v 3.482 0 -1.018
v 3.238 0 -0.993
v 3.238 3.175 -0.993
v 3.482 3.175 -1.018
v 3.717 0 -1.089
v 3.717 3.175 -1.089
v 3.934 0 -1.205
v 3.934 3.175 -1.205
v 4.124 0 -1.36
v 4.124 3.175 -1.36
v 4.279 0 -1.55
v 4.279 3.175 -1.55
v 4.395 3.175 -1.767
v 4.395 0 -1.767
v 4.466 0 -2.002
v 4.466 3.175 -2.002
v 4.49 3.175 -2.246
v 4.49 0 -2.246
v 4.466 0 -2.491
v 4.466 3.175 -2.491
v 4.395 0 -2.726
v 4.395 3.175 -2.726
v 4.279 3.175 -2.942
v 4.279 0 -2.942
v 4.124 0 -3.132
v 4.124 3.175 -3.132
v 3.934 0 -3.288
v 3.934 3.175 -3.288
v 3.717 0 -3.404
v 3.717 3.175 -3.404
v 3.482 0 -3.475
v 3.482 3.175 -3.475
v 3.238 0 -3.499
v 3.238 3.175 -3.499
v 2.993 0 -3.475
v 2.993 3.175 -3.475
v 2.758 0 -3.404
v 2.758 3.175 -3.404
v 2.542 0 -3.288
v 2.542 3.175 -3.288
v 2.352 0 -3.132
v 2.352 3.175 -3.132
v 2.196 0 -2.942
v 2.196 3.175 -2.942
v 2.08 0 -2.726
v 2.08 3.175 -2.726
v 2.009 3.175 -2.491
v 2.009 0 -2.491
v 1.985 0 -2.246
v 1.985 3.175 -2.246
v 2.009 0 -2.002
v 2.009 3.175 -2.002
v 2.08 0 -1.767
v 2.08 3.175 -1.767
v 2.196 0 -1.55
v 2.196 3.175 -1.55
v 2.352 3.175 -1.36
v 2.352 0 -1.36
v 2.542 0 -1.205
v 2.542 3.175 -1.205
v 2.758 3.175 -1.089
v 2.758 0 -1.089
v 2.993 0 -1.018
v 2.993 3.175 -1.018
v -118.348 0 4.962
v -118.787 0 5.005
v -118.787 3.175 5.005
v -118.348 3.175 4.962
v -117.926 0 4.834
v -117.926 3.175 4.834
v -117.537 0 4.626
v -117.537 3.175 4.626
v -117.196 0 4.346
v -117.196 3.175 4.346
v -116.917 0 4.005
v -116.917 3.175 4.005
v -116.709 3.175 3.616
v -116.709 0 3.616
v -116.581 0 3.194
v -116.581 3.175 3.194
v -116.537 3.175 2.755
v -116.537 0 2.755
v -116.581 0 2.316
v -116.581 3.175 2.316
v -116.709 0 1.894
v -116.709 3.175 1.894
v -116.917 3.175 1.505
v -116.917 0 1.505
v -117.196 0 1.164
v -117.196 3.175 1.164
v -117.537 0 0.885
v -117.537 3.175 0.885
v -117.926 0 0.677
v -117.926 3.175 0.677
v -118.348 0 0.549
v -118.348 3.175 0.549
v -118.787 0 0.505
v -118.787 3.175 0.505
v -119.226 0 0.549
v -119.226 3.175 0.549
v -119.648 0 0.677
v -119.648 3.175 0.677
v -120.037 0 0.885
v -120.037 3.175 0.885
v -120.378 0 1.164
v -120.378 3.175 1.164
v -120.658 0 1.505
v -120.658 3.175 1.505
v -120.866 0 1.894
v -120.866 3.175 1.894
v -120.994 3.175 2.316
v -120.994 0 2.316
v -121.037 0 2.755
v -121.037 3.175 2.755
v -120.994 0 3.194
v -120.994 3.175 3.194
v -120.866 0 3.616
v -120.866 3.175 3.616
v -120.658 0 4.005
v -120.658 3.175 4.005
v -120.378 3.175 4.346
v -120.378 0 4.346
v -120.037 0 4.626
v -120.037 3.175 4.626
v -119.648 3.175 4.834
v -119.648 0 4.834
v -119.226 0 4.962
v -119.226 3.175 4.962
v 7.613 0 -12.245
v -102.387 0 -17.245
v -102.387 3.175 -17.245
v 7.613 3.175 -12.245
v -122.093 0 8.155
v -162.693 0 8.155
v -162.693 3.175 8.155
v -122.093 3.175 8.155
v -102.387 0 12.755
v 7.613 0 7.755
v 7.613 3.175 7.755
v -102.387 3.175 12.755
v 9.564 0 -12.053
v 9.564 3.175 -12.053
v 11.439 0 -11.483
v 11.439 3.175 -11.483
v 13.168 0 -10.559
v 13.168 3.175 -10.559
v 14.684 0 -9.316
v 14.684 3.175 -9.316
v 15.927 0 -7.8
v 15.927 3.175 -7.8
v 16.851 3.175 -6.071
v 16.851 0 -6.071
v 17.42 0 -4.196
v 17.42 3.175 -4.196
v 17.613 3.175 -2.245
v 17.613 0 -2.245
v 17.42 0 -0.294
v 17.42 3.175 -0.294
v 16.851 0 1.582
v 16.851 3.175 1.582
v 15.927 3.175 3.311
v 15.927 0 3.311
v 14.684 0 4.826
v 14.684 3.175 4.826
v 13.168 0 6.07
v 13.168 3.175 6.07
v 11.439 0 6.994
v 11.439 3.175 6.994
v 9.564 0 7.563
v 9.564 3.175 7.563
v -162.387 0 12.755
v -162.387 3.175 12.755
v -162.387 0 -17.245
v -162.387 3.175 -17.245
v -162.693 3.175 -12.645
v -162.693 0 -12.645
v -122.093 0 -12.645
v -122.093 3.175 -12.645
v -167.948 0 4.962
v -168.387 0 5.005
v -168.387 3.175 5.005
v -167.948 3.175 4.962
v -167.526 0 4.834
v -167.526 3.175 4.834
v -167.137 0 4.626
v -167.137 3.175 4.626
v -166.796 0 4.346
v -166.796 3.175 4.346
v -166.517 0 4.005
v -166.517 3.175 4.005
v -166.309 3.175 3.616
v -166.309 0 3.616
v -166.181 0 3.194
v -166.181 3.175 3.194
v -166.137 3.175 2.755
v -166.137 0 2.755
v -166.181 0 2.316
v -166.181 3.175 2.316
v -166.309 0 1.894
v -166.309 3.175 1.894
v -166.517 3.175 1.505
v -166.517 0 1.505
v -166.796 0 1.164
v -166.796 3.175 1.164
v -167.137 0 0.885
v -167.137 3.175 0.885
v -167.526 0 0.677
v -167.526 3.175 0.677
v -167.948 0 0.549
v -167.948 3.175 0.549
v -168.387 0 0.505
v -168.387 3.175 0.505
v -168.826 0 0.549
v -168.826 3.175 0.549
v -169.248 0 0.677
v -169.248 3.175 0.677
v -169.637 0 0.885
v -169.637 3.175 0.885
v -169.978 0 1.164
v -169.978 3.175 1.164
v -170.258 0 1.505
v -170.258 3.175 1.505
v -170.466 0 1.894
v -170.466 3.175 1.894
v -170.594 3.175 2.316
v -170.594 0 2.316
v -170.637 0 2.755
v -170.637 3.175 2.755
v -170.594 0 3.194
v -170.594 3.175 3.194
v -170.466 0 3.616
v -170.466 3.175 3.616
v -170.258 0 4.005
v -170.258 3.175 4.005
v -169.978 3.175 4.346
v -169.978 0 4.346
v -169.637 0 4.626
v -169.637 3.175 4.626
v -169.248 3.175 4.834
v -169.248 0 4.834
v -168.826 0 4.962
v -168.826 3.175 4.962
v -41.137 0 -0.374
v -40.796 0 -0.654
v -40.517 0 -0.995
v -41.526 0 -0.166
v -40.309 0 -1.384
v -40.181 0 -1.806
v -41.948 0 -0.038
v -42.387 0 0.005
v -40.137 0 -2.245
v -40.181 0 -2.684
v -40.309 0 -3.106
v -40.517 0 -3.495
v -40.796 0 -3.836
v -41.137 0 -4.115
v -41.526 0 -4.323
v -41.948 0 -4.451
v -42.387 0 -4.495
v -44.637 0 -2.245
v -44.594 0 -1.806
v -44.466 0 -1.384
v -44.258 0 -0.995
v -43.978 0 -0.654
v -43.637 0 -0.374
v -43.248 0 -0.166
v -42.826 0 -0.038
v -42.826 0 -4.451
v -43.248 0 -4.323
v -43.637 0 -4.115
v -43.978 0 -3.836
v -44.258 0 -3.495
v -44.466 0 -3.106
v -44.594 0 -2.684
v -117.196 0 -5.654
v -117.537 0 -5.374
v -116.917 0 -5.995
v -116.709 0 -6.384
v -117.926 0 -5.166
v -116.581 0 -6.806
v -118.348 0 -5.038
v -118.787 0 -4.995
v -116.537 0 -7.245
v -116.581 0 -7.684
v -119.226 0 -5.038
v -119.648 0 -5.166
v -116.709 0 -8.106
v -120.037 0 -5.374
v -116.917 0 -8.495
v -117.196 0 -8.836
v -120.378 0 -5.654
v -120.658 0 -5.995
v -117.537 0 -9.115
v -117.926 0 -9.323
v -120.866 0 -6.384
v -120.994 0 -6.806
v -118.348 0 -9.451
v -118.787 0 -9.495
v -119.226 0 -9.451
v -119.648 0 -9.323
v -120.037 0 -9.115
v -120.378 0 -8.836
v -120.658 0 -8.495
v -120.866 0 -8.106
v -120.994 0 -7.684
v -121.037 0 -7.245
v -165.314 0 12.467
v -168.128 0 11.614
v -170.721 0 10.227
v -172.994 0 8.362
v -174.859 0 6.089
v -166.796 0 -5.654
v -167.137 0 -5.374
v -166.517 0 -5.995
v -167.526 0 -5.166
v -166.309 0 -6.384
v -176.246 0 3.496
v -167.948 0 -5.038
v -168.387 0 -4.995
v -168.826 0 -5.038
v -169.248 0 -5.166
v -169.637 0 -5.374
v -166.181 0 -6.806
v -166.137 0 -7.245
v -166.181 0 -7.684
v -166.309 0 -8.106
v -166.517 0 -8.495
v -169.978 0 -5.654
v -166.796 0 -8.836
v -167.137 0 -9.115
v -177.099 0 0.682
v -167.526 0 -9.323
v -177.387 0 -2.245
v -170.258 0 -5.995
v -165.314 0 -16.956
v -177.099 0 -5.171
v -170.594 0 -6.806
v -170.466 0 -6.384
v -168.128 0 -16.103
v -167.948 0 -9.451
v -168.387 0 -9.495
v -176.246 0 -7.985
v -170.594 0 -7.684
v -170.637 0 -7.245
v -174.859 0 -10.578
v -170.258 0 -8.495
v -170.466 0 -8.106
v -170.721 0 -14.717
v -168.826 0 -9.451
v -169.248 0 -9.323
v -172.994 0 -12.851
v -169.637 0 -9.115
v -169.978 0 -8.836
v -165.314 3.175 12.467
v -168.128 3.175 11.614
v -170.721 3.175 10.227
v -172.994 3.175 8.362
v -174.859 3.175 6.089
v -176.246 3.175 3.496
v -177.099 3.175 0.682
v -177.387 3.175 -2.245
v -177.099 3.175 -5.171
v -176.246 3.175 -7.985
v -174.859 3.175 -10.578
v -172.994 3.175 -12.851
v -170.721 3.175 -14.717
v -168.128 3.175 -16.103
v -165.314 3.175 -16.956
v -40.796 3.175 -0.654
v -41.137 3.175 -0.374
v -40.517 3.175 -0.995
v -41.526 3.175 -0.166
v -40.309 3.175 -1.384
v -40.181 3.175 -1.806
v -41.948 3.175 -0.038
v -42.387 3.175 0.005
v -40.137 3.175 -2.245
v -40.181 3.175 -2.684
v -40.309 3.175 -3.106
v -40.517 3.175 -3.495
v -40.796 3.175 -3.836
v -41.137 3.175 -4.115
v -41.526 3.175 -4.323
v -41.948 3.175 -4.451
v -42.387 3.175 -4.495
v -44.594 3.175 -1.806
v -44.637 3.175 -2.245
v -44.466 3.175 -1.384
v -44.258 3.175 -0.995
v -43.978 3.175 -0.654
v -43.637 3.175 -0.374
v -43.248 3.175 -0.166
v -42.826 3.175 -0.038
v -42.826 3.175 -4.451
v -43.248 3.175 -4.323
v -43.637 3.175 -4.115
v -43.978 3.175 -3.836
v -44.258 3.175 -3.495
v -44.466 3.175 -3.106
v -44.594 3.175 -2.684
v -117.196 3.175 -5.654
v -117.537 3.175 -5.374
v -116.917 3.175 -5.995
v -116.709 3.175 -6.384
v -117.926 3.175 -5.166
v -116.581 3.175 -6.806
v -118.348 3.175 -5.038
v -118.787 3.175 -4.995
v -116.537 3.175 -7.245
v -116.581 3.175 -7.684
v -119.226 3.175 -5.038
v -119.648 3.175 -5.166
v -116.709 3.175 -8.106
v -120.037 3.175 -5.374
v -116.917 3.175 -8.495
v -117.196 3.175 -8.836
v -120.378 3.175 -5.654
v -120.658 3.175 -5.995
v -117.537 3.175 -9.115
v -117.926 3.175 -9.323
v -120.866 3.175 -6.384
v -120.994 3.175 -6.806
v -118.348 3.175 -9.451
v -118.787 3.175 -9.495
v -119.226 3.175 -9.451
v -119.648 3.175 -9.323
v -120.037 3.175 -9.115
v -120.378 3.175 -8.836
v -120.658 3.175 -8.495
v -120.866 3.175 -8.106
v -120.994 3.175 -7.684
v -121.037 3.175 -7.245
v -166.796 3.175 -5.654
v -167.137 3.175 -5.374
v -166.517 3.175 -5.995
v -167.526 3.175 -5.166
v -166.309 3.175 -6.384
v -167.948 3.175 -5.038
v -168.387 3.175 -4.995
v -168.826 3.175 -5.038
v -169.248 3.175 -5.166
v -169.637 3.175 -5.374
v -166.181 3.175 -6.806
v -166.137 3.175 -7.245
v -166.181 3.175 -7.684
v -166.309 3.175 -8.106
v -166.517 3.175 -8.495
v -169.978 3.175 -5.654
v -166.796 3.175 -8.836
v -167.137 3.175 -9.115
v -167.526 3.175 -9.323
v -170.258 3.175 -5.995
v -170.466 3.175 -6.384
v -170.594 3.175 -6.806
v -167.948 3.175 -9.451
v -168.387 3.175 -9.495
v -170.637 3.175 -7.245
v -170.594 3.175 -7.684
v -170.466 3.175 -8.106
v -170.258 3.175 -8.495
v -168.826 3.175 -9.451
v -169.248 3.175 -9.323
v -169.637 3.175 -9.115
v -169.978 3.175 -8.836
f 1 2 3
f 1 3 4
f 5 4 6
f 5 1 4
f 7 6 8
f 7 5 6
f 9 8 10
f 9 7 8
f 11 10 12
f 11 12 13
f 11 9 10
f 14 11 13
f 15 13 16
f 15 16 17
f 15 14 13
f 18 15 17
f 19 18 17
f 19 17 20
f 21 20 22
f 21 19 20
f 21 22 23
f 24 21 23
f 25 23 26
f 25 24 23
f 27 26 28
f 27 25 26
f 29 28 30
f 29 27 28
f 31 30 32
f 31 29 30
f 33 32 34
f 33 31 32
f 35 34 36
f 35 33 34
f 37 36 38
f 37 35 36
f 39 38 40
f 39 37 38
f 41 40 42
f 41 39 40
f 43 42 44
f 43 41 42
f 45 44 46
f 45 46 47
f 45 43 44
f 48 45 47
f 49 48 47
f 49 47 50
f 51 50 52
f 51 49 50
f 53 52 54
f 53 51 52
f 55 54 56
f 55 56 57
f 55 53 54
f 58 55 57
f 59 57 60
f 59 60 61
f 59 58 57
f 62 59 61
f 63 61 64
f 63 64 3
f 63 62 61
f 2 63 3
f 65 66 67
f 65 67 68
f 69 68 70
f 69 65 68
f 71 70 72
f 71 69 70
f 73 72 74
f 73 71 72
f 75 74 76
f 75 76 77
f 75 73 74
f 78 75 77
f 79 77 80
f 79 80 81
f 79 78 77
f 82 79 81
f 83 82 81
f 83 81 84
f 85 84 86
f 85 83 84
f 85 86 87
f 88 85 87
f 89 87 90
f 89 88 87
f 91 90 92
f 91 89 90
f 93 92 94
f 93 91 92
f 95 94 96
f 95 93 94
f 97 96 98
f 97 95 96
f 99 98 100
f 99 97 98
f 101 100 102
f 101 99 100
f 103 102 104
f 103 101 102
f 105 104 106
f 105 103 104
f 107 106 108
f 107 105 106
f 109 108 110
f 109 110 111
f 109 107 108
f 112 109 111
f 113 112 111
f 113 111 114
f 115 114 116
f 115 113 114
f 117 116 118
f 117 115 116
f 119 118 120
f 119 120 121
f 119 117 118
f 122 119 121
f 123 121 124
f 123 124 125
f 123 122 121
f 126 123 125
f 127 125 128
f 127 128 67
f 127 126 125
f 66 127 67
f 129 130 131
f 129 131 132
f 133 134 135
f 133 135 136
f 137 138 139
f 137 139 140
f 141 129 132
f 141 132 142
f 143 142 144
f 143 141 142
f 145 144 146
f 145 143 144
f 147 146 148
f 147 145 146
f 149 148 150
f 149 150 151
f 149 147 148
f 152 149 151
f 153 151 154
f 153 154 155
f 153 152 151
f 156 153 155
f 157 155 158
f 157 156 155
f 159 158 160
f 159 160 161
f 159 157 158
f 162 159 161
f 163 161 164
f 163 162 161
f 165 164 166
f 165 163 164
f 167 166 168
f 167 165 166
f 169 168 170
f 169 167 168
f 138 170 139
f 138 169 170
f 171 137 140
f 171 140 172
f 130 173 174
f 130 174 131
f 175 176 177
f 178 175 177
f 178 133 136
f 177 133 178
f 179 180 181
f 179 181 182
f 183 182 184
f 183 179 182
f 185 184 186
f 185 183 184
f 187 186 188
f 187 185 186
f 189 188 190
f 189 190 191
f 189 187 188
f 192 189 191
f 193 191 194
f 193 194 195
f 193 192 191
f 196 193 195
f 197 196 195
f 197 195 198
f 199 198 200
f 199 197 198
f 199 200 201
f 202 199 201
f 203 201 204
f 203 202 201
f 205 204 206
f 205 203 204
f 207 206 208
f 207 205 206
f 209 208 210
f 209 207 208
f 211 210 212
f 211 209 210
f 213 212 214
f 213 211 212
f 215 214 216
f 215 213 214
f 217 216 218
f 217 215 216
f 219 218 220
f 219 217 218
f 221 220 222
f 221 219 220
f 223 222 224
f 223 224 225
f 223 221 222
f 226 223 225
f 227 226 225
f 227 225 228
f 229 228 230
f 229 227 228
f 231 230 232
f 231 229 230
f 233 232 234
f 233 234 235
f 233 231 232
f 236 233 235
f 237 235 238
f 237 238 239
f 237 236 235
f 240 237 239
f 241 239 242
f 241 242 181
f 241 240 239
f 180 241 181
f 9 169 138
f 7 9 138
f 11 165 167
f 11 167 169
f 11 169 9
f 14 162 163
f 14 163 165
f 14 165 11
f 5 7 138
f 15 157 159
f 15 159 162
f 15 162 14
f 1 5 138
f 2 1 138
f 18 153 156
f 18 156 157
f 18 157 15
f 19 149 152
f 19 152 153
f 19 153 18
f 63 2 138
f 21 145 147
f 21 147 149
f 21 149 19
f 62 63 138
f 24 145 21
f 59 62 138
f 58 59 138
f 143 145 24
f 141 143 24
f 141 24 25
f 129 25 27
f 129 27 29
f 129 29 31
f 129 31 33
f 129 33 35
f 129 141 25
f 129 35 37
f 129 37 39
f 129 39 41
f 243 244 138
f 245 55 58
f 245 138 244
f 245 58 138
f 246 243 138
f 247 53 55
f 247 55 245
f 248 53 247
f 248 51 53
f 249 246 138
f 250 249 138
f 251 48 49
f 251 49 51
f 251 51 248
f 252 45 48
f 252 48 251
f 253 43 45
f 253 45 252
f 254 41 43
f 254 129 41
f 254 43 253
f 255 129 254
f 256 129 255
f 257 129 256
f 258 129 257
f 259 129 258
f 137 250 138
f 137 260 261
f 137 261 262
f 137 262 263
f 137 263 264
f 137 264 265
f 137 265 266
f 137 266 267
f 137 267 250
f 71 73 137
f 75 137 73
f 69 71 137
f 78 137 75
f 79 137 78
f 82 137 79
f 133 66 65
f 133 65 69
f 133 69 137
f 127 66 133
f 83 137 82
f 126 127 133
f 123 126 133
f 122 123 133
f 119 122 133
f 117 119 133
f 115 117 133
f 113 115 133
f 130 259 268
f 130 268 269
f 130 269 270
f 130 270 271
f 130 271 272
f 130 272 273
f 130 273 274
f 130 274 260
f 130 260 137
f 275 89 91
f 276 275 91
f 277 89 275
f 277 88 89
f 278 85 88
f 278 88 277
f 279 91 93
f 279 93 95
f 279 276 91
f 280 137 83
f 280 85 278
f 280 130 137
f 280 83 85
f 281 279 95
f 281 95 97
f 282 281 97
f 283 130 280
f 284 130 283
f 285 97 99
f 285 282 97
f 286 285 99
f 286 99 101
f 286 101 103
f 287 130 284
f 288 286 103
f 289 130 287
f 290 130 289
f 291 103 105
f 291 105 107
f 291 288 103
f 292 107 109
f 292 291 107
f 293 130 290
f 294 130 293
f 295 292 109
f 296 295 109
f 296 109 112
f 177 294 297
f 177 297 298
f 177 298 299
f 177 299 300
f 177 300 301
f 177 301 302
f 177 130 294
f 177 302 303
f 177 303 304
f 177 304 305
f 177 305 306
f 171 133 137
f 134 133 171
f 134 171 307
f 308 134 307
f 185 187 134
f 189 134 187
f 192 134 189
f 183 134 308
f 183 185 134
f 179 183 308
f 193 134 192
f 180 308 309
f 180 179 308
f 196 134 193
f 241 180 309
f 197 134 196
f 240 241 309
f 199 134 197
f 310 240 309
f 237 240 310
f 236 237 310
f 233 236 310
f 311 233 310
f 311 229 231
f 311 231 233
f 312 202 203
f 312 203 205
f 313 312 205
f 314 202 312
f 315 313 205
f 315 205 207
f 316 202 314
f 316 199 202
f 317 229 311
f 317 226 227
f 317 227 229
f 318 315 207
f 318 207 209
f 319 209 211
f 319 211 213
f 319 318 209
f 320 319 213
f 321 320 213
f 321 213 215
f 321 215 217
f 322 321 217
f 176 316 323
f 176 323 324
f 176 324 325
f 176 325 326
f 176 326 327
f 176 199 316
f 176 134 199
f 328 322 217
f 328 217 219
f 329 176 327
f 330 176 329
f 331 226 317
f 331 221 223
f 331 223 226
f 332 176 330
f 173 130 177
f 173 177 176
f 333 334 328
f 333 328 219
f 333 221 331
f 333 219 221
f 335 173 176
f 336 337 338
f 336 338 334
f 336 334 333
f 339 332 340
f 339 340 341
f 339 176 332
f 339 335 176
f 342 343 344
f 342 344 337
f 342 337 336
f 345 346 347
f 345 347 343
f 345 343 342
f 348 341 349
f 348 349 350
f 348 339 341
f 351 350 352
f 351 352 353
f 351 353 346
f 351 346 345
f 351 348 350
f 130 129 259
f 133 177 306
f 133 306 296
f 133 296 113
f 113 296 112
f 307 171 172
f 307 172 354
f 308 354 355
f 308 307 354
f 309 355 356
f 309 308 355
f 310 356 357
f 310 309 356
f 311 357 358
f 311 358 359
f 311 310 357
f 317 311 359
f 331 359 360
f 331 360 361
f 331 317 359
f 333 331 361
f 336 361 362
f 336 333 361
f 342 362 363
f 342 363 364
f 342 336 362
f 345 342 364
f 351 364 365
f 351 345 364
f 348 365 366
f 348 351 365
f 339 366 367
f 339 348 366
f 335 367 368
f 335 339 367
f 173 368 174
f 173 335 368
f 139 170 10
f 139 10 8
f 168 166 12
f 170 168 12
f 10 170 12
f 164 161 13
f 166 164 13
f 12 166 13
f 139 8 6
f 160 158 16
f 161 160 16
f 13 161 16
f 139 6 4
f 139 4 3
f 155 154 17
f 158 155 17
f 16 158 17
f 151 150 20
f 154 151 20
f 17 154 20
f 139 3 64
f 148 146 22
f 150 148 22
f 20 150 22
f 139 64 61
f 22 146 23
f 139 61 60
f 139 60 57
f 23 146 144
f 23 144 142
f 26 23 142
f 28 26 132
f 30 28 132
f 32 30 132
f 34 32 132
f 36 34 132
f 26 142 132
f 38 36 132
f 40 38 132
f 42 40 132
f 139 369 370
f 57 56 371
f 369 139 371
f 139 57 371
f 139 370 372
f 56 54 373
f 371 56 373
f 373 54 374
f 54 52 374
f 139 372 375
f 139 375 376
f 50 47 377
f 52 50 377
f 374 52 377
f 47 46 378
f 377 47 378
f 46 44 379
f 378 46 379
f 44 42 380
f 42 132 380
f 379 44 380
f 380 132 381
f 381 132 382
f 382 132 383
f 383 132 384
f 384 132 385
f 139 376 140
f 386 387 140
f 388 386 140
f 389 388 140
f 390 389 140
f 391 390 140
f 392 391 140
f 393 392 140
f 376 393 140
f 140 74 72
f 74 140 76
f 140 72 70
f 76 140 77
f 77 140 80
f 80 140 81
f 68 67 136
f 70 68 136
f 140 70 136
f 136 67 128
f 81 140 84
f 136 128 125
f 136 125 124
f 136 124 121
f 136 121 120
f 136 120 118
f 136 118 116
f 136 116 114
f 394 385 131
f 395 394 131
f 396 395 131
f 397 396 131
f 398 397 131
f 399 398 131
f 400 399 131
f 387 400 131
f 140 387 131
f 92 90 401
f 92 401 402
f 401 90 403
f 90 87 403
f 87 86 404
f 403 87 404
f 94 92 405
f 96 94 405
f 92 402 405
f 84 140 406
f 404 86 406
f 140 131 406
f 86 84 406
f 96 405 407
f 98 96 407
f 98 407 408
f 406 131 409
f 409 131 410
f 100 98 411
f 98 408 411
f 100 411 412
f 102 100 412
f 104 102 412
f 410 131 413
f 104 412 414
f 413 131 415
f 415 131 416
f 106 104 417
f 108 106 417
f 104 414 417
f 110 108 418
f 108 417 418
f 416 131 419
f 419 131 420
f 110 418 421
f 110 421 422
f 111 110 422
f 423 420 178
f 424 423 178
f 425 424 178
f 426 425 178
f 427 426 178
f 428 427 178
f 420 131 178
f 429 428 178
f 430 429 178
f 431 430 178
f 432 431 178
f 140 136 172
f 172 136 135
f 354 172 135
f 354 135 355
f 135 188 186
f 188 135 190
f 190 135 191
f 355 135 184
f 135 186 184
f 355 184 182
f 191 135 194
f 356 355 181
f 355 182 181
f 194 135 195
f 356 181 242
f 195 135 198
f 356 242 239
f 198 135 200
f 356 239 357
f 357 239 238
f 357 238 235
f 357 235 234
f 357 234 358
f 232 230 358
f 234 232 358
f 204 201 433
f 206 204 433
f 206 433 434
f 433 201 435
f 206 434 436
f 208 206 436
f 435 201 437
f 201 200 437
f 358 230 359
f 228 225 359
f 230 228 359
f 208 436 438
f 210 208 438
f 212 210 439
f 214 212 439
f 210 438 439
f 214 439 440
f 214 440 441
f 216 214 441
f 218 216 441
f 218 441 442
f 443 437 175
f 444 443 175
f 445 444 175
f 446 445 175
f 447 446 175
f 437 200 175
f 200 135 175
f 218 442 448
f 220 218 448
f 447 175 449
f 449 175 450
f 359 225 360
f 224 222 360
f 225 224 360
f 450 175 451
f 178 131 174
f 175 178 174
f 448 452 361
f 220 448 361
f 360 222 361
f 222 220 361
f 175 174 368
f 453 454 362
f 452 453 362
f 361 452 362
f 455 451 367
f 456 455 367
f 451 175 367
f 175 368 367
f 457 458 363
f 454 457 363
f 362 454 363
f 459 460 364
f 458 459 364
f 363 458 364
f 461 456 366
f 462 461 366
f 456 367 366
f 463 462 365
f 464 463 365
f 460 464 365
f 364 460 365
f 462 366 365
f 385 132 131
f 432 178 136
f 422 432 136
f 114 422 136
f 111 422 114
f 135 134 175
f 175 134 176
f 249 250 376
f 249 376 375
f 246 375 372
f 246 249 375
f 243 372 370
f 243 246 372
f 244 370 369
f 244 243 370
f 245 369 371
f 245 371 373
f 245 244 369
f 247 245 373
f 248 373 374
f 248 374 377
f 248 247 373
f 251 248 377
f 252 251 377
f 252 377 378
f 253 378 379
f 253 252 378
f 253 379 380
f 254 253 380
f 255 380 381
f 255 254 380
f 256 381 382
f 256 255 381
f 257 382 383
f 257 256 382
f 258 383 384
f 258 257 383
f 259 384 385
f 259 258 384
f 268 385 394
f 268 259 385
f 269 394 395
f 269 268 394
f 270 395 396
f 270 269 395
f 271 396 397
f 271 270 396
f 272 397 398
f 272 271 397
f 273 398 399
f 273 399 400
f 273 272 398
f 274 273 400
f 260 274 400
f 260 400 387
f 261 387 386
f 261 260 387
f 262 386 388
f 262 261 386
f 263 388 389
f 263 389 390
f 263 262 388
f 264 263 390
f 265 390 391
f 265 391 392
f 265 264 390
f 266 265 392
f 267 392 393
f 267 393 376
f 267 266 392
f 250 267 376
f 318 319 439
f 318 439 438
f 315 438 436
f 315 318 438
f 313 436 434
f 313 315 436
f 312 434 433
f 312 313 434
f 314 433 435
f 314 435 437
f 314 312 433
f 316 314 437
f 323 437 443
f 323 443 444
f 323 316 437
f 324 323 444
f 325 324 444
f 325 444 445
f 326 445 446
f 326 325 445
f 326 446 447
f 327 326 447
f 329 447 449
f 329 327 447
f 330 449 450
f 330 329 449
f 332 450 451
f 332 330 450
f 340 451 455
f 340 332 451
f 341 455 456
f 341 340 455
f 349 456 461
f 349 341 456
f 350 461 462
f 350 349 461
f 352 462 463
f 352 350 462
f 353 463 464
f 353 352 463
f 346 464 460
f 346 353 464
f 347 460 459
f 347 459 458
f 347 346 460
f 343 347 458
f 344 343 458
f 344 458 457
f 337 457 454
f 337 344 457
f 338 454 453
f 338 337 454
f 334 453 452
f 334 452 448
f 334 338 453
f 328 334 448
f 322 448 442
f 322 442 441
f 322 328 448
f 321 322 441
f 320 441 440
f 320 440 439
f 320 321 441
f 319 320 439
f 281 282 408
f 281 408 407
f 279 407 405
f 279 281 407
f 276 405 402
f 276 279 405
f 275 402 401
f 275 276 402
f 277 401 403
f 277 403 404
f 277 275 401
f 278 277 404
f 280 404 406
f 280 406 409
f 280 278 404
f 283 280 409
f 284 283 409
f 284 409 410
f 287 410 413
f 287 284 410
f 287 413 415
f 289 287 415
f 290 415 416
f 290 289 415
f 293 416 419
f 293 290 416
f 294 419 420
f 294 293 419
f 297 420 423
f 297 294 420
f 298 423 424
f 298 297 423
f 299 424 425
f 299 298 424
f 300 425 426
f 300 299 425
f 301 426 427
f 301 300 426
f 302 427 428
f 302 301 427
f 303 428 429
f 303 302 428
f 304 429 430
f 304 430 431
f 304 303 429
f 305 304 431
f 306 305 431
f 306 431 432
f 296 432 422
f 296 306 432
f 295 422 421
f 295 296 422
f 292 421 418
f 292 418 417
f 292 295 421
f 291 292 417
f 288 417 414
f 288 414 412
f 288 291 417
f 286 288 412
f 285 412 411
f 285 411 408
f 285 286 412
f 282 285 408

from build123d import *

# Parameters (mm, degrees)
SKETCH1_R           = 2.25
SKETCH1_R_2         = 1.25282433
SKETCH1_W           = 40.6
SKETCH1_H           = 20.8
BOSS_EXTRUDE1_DEPTH = 3.175


with BuildPart() as part:
    # Sketch1 → Boss-Extrude1 (new body)
    with BuildSketch(Plane(origin=(0, 0, 0), x_dir=(1, 0, 0), z_dir=(0, 1, 0))):
        with BuildLine():
            Line((-162.38735588, 17.244652891), (-102.38735588, 17.244652891))
            Line((-102.38735588, 17.244652891), (7.61264412, 12.244652891))
            ThreePointArc((7.61264412, 12.244652891), (17.61264412, 2.244652891), (7.61264412, -7.755347109))
            Line((7.61264412, -7.755347109), (-102.38735588, -12.755347109))
            Line((-102.38735588, -12.755347109), (-162.38735588, -12.755347109))
            ThreePointArc((-162.38735588, -12.755347109), (-177.38735588, 2.244652891), (-162.38735588, 17.244652891))
        make_face()
        with Locations(Location((-168.38735588, 7.244652891, 0), (0, 0, 270))):
            Circle(SKETCH1_R, mode=Mode.SUBTRACT)
        with Locations(Location((-168.38735588, -2.755347109, 0), (0, 0, 270))):
            Circle(SKETCH1_R, mode=Mode.SUBTRACT)
        with Locations(Location((-118.78735588, 7.244652891, 0), (0, 0, 270))):
            Circle(SKETCH1_R, mode=Mode.SUBTRACT)
        with Locations(Location((-118.78735588, -2.755347109, 0), (0, 0, 270))):
            Circle(SKETCH1_R, mode=Mode.SUBTRACT)
        with Locations(Location((-42.38735588, 2.244652891, 0), (0, 0, 270))):
            Circle(SKETCH1_R, mode=Mode.SUBTRACT)
        with Locations(Location((3.23764412, 2.246310682, 0), (0, 0, 270))):
            Circle(SKETCH1_R_2, mode=Mode.SUBTRACT)
        with Locations((-142.392621679, 2.244652891)):
            Rectangle(SKETCH1_W, SKETCH1_H, mode=Mode.SUBTRACT)
    extrude(amount=BOSS_EXTRUDE1_DEPTH)


solid = part.part
